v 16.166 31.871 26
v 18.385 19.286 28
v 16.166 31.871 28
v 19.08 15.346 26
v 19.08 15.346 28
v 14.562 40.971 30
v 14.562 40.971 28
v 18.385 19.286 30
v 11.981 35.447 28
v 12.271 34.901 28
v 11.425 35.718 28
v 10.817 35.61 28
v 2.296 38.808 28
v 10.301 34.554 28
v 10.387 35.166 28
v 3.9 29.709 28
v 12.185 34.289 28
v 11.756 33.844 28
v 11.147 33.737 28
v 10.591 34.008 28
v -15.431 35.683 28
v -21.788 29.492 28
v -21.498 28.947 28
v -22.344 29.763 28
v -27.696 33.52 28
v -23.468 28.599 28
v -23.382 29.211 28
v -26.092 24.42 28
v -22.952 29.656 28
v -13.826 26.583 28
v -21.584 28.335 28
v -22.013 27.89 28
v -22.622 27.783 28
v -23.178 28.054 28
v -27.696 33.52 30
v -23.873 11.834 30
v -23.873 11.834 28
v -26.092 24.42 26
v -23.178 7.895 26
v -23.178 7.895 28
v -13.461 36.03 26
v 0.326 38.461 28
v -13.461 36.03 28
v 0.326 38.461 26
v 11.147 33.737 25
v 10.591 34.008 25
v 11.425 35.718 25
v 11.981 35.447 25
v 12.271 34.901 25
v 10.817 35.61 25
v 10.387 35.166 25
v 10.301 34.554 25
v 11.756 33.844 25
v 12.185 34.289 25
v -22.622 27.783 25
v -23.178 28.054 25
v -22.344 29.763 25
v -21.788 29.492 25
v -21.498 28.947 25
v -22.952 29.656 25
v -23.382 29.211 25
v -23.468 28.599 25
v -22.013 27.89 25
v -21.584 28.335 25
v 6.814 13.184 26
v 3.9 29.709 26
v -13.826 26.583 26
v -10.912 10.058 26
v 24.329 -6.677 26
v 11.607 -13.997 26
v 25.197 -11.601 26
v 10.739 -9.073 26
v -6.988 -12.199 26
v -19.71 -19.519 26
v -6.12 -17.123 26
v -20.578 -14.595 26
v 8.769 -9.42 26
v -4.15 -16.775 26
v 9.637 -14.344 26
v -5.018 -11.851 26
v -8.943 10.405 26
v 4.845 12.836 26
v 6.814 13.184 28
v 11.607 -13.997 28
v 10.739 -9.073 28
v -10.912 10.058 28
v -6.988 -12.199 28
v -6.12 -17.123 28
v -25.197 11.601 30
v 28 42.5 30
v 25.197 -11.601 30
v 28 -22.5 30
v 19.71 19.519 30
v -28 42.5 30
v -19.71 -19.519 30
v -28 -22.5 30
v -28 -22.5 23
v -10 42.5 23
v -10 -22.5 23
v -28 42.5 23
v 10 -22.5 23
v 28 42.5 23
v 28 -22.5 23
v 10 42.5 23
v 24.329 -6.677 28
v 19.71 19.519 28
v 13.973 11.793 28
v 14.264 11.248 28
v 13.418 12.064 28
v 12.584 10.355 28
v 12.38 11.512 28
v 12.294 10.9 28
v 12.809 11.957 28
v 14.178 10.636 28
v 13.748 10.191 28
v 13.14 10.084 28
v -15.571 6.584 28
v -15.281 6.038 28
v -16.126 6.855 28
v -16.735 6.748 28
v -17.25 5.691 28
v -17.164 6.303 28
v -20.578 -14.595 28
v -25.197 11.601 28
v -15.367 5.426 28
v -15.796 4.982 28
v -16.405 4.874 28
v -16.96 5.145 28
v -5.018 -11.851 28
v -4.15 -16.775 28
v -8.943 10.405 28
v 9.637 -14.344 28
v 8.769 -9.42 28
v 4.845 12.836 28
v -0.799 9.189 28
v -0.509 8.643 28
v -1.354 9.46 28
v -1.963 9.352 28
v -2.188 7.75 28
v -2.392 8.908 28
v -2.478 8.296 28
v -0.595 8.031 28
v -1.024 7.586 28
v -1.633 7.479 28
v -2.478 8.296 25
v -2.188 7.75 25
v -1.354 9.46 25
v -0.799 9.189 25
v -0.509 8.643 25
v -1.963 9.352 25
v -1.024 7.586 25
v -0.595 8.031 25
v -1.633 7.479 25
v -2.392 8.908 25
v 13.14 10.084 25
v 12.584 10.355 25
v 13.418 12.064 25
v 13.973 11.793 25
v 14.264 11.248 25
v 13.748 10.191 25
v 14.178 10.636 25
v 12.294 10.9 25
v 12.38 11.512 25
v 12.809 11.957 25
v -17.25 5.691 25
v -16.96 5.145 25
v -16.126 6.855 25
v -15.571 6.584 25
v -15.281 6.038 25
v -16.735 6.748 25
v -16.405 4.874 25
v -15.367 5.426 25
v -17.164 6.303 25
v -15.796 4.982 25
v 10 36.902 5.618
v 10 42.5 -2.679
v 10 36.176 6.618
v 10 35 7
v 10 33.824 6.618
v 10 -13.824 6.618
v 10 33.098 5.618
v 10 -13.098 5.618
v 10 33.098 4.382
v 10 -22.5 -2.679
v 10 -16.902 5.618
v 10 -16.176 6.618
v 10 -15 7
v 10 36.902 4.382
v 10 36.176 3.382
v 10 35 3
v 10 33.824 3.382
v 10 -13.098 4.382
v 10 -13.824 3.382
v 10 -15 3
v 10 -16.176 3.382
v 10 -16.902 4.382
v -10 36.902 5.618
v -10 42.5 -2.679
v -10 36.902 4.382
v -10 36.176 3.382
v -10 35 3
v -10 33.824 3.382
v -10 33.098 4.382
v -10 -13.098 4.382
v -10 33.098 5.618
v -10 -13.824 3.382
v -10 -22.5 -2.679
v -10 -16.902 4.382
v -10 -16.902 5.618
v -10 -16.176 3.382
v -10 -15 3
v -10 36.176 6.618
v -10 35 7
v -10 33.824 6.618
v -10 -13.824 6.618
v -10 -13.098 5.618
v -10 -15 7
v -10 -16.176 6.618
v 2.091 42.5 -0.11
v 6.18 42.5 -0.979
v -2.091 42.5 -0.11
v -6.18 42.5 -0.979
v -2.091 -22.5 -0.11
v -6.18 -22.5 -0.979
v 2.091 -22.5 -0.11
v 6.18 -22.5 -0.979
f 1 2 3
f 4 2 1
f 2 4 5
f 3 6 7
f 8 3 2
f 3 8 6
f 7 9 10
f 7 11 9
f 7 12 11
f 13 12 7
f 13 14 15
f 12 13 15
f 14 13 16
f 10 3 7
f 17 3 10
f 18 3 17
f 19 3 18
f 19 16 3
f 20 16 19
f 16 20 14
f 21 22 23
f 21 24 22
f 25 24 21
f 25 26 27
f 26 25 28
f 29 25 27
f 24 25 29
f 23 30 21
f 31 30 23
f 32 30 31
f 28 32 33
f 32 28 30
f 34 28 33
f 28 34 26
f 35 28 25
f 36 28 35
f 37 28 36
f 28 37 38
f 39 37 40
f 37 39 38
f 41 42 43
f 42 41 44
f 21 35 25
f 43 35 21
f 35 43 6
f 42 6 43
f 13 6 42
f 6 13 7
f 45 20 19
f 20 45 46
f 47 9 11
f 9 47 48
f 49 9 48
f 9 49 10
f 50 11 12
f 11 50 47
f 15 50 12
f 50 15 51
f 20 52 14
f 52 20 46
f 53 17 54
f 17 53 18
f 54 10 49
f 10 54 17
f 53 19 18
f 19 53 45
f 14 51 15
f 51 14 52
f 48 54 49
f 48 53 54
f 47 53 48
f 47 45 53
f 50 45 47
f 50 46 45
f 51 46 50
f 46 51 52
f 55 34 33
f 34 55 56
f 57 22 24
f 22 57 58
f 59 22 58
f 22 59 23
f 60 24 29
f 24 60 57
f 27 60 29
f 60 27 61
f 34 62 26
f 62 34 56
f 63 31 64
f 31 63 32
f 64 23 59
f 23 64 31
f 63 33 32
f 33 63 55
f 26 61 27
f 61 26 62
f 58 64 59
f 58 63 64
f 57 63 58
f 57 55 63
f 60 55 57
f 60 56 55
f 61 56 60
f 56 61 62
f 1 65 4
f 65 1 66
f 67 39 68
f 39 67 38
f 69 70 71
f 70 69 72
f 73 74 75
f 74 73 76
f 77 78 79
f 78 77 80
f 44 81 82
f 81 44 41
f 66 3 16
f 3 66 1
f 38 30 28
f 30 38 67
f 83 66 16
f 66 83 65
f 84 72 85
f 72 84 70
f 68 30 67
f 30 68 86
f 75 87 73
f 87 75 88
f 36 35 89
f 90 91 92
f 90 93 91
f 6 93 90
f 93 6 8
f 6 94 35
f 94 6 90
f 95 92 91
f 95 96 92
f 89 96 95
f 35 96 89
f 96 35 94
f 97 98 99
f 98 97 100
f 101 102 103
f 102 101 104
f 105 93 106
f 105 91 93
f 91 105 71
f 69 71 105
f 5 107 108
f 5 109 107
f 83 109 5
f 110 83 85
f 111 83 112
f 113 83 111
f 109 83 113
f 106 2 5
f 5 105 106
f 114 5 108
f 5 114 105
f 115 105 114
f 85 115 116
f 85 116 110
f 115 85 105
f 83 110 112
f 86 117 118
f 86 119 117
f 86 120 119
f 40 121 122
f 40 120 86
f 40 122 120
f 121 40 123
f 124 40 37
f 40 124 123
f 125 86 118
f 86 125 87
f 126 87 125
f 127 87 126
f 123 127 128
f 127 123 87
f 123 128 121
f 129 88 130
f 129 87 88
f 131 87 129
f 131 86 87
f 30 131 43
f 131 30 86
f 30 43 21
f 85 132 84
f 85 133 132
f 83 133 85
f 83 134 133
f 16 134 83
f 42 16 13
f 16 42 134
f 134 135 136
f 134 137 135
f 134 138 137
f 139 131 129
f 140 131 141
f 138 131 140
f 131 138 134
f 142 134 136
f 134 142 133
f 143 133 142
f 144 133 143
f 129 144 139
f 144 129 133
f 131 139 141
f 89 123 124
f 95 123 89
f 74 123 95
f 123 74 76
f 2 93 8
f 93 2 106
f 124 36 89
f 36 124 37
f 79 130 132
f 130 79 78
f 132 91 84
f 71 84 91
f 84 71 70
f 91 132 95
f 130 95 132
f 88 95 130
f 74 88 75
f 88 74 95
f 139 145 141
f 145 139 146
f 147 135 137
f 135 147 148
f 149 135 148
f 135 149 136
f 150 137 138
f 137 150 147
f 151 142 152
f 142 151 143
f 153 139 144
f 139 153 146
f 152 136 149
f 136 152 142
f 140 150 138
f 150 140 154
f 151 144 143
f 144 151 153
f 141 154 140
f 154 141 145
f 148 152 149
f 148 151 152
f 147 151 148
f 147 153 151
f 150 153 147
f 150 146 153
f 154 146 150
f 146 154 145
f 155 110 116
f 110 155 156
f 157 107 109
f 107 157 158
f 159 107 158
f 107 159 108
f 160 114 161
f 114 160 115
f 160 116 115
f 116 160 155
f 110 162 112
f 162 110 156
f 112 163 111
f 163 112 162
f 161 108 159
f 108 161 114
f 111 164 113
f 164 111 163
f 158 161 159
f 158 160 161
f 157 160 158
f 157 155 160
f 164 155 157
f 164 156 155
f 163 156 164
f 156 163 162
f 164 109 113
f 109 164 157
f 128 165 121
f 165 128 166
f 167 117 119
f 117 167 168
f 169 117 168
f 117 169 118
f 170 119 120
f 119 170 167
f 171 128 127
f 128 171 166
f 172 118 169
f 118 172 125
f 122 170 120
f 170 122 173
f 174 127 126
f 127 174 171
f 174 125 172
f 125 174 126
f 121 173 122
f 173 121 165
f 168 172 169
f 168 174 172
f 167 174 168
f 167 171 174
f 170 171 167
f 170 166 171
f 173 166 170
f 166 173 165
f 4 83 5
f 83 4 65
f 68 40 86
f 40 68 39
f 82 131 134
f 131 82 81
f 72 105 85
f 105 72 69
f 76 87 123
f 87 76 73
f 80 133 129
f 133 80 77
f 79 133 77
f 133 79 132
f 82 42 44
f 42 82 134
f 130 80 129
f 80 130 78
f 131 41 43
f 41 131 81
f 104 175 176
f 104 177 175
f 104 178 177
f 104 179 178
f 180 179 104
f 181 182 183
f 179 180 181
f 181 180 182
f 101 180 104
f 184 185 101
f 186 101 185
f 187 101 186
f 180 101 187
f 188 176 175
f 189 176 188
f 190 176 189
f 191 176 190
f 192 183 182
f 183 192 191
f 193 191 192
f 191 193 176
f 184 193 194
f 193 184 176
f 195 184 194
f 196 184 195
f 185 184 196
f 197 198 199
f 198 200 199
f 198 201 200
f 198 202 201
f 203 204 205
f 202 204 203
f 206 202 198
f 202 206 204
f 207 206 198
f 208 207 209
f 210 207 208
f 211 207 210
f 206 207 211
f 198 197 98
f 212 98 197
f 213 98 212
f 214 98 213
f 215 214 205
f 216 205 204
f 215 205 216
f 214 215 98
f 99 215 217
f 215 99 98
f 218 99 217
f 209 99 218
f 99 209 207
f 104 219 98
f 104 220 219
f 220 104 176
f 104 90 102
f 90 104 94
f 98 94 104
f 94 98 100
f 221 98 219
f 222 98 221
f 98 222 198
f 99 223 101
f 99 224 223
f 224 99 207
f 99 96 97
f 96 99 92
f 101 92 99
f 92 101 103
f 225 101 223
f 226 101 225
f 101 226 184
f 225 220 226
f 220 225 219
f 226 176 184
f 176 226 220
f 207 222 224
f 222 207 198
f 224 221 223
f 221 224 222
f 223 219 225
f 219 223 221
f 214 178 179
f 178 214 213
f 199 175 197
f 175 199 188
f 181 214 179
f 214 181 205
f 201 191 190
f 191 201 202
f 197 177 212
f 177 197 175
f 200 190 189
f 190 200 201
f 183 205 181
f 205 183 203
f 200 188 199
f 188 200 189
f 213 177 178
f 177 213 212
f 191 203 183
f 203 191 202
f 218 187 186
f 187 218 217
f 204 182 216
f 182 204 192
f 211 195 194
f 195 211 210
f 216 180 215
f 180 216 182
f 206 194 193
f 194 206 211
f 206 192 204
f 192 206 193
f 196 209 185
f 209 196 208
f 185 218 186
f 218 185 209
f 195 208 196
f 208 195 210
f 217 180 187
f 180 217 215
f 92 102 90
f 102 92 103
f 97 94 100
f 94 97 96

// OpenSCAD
true_grubosc = 30;
kat = 10;

grubosc = true_grubosc*2;
grubosc_skrzydelek = 7;
szerokosc_hall = 14.2;
dlugosc_hall = 31.2;
odstep = 1.5;
wkret_sr = 2;

sz_plytka = 15.24;
dl_plyrka = 41.91;
odstep_plytka = 6.2;
plytka_marg = 1;

granica_x = 56;
granica_y = 65;

module wanna(h){
    difference(){
        cube([20,50,h],center = true);
        
        translate([0,0,h/2]){
        cube([15, 33, 4],center=true);
        }
    }
}

module trzon(){
    difference(){
    cube([20,65,grubosc-grubosc_skrzydelek*2],center = true);
    
    translate([0,0,-20]){
        rotate([90,0,0]){
            #cylinder(h=80, r=20, center=true);
        }
    }
    
    translate([0,25,5]){
        rotate([0,90,0]){
            #cylinder(h=60, r=2, center=true, $fn=10);
        }
    }
        translate([0,-25,5]){
        rotate([0,90,0]){
            #cylinder(h=60, r=2, center=true, $fn=10);
        }
    }
}
}

module wkret(){
    translate([0,15.6-7,grubosc/2]){
      cylinder(h=10, d=wkret_sr, center=true, $fn=10);
    }
}


difference(){
union(){
    rotate([0,0,kat]){
union(){
difference(){
union(){

    translate([0,10,grubosc/2-grubosc_skrzydelek/2]){
    cube([70,80,grubosc_skrzydelek], center = true);
    }
    //translate([0,0,grubosc/2]){
      //  #cube([15, 33, 4],center=true);}
}
        translate([0,0,grubosc/2]){
        cube([szerokosc_hall*3+odstep*2, dlugosc_hall+0.4, 4],center=true);
    }
    
    wkret();
    
    translate([15,0,0]){
    wkret();
    }
    
     translate([-15,0,0]){
    wkret();
    }
    
    translate([0,(dlugosc_hall+0.4)/2-2,grubosc/2])
    cube([dl_plyrka+plytka_marg, 4, 4+4],center=true);
    
    translate([0,-(dlugosc_hall+0.4)/2+2.5,grubosc/2])
    cube([szerokosc_hall*3+odstep*2, 5, 4+4],center=true);
    
    translate([0,-4.5+odstep_plytka,0]){
    translate([0,28,grubosc/2])
    cube([dl_plyrka+plytka_marg, sz_plytka+plytka_marg, 4],center=true);
    
    translate([dl_plyrka/2-3.81,28-15.6+7+sz_plytka/2-5.08,0]){
    wkret();
    }
    
    translate([-dl_plyrka/2+3.81,28-15.6+7+sz_plytka/2-5.08,0]){
    wkret();
    }
    
    translate([0,28-(sz_plytka+plytka_marg)/2+3.5,grubosc/2])
    cube([dl_plyrka+plytka_marg, 7, 4+4],center=true);
    
    translate([0,28,grubosc/2])
    cube([18, sz_plytka+plytka_marg, 4+4],center=true);
    
    translate([0,18,grubosc/2])
    cube([dl_plyrka+plytka_marg, 8, 4+4],center=true);
}


}
    translate([8,10,grubosc/2-3])
    cube([2, 65, 2],center=true);

    translate([-8,10,grubosc/2-3])
    cube([2, 65, 2],center=true);
}
}
   translate([0,10,0])
   trzon();
}
    translate([0,-granica_y/2,0])
    #cube([100,20,grubosc+10],center=true);

    translate([0,granica_y/2+20,0])
    #cube([100,20,grubosc+10],center=true);

    translate([granica_x/2+10,0,0])
    #cube([20,100,grubosc+10],center=true);

    translate([-granica_x/2-10,0,0])
    #cube([20,100,grubosc+10],center=true);

}
